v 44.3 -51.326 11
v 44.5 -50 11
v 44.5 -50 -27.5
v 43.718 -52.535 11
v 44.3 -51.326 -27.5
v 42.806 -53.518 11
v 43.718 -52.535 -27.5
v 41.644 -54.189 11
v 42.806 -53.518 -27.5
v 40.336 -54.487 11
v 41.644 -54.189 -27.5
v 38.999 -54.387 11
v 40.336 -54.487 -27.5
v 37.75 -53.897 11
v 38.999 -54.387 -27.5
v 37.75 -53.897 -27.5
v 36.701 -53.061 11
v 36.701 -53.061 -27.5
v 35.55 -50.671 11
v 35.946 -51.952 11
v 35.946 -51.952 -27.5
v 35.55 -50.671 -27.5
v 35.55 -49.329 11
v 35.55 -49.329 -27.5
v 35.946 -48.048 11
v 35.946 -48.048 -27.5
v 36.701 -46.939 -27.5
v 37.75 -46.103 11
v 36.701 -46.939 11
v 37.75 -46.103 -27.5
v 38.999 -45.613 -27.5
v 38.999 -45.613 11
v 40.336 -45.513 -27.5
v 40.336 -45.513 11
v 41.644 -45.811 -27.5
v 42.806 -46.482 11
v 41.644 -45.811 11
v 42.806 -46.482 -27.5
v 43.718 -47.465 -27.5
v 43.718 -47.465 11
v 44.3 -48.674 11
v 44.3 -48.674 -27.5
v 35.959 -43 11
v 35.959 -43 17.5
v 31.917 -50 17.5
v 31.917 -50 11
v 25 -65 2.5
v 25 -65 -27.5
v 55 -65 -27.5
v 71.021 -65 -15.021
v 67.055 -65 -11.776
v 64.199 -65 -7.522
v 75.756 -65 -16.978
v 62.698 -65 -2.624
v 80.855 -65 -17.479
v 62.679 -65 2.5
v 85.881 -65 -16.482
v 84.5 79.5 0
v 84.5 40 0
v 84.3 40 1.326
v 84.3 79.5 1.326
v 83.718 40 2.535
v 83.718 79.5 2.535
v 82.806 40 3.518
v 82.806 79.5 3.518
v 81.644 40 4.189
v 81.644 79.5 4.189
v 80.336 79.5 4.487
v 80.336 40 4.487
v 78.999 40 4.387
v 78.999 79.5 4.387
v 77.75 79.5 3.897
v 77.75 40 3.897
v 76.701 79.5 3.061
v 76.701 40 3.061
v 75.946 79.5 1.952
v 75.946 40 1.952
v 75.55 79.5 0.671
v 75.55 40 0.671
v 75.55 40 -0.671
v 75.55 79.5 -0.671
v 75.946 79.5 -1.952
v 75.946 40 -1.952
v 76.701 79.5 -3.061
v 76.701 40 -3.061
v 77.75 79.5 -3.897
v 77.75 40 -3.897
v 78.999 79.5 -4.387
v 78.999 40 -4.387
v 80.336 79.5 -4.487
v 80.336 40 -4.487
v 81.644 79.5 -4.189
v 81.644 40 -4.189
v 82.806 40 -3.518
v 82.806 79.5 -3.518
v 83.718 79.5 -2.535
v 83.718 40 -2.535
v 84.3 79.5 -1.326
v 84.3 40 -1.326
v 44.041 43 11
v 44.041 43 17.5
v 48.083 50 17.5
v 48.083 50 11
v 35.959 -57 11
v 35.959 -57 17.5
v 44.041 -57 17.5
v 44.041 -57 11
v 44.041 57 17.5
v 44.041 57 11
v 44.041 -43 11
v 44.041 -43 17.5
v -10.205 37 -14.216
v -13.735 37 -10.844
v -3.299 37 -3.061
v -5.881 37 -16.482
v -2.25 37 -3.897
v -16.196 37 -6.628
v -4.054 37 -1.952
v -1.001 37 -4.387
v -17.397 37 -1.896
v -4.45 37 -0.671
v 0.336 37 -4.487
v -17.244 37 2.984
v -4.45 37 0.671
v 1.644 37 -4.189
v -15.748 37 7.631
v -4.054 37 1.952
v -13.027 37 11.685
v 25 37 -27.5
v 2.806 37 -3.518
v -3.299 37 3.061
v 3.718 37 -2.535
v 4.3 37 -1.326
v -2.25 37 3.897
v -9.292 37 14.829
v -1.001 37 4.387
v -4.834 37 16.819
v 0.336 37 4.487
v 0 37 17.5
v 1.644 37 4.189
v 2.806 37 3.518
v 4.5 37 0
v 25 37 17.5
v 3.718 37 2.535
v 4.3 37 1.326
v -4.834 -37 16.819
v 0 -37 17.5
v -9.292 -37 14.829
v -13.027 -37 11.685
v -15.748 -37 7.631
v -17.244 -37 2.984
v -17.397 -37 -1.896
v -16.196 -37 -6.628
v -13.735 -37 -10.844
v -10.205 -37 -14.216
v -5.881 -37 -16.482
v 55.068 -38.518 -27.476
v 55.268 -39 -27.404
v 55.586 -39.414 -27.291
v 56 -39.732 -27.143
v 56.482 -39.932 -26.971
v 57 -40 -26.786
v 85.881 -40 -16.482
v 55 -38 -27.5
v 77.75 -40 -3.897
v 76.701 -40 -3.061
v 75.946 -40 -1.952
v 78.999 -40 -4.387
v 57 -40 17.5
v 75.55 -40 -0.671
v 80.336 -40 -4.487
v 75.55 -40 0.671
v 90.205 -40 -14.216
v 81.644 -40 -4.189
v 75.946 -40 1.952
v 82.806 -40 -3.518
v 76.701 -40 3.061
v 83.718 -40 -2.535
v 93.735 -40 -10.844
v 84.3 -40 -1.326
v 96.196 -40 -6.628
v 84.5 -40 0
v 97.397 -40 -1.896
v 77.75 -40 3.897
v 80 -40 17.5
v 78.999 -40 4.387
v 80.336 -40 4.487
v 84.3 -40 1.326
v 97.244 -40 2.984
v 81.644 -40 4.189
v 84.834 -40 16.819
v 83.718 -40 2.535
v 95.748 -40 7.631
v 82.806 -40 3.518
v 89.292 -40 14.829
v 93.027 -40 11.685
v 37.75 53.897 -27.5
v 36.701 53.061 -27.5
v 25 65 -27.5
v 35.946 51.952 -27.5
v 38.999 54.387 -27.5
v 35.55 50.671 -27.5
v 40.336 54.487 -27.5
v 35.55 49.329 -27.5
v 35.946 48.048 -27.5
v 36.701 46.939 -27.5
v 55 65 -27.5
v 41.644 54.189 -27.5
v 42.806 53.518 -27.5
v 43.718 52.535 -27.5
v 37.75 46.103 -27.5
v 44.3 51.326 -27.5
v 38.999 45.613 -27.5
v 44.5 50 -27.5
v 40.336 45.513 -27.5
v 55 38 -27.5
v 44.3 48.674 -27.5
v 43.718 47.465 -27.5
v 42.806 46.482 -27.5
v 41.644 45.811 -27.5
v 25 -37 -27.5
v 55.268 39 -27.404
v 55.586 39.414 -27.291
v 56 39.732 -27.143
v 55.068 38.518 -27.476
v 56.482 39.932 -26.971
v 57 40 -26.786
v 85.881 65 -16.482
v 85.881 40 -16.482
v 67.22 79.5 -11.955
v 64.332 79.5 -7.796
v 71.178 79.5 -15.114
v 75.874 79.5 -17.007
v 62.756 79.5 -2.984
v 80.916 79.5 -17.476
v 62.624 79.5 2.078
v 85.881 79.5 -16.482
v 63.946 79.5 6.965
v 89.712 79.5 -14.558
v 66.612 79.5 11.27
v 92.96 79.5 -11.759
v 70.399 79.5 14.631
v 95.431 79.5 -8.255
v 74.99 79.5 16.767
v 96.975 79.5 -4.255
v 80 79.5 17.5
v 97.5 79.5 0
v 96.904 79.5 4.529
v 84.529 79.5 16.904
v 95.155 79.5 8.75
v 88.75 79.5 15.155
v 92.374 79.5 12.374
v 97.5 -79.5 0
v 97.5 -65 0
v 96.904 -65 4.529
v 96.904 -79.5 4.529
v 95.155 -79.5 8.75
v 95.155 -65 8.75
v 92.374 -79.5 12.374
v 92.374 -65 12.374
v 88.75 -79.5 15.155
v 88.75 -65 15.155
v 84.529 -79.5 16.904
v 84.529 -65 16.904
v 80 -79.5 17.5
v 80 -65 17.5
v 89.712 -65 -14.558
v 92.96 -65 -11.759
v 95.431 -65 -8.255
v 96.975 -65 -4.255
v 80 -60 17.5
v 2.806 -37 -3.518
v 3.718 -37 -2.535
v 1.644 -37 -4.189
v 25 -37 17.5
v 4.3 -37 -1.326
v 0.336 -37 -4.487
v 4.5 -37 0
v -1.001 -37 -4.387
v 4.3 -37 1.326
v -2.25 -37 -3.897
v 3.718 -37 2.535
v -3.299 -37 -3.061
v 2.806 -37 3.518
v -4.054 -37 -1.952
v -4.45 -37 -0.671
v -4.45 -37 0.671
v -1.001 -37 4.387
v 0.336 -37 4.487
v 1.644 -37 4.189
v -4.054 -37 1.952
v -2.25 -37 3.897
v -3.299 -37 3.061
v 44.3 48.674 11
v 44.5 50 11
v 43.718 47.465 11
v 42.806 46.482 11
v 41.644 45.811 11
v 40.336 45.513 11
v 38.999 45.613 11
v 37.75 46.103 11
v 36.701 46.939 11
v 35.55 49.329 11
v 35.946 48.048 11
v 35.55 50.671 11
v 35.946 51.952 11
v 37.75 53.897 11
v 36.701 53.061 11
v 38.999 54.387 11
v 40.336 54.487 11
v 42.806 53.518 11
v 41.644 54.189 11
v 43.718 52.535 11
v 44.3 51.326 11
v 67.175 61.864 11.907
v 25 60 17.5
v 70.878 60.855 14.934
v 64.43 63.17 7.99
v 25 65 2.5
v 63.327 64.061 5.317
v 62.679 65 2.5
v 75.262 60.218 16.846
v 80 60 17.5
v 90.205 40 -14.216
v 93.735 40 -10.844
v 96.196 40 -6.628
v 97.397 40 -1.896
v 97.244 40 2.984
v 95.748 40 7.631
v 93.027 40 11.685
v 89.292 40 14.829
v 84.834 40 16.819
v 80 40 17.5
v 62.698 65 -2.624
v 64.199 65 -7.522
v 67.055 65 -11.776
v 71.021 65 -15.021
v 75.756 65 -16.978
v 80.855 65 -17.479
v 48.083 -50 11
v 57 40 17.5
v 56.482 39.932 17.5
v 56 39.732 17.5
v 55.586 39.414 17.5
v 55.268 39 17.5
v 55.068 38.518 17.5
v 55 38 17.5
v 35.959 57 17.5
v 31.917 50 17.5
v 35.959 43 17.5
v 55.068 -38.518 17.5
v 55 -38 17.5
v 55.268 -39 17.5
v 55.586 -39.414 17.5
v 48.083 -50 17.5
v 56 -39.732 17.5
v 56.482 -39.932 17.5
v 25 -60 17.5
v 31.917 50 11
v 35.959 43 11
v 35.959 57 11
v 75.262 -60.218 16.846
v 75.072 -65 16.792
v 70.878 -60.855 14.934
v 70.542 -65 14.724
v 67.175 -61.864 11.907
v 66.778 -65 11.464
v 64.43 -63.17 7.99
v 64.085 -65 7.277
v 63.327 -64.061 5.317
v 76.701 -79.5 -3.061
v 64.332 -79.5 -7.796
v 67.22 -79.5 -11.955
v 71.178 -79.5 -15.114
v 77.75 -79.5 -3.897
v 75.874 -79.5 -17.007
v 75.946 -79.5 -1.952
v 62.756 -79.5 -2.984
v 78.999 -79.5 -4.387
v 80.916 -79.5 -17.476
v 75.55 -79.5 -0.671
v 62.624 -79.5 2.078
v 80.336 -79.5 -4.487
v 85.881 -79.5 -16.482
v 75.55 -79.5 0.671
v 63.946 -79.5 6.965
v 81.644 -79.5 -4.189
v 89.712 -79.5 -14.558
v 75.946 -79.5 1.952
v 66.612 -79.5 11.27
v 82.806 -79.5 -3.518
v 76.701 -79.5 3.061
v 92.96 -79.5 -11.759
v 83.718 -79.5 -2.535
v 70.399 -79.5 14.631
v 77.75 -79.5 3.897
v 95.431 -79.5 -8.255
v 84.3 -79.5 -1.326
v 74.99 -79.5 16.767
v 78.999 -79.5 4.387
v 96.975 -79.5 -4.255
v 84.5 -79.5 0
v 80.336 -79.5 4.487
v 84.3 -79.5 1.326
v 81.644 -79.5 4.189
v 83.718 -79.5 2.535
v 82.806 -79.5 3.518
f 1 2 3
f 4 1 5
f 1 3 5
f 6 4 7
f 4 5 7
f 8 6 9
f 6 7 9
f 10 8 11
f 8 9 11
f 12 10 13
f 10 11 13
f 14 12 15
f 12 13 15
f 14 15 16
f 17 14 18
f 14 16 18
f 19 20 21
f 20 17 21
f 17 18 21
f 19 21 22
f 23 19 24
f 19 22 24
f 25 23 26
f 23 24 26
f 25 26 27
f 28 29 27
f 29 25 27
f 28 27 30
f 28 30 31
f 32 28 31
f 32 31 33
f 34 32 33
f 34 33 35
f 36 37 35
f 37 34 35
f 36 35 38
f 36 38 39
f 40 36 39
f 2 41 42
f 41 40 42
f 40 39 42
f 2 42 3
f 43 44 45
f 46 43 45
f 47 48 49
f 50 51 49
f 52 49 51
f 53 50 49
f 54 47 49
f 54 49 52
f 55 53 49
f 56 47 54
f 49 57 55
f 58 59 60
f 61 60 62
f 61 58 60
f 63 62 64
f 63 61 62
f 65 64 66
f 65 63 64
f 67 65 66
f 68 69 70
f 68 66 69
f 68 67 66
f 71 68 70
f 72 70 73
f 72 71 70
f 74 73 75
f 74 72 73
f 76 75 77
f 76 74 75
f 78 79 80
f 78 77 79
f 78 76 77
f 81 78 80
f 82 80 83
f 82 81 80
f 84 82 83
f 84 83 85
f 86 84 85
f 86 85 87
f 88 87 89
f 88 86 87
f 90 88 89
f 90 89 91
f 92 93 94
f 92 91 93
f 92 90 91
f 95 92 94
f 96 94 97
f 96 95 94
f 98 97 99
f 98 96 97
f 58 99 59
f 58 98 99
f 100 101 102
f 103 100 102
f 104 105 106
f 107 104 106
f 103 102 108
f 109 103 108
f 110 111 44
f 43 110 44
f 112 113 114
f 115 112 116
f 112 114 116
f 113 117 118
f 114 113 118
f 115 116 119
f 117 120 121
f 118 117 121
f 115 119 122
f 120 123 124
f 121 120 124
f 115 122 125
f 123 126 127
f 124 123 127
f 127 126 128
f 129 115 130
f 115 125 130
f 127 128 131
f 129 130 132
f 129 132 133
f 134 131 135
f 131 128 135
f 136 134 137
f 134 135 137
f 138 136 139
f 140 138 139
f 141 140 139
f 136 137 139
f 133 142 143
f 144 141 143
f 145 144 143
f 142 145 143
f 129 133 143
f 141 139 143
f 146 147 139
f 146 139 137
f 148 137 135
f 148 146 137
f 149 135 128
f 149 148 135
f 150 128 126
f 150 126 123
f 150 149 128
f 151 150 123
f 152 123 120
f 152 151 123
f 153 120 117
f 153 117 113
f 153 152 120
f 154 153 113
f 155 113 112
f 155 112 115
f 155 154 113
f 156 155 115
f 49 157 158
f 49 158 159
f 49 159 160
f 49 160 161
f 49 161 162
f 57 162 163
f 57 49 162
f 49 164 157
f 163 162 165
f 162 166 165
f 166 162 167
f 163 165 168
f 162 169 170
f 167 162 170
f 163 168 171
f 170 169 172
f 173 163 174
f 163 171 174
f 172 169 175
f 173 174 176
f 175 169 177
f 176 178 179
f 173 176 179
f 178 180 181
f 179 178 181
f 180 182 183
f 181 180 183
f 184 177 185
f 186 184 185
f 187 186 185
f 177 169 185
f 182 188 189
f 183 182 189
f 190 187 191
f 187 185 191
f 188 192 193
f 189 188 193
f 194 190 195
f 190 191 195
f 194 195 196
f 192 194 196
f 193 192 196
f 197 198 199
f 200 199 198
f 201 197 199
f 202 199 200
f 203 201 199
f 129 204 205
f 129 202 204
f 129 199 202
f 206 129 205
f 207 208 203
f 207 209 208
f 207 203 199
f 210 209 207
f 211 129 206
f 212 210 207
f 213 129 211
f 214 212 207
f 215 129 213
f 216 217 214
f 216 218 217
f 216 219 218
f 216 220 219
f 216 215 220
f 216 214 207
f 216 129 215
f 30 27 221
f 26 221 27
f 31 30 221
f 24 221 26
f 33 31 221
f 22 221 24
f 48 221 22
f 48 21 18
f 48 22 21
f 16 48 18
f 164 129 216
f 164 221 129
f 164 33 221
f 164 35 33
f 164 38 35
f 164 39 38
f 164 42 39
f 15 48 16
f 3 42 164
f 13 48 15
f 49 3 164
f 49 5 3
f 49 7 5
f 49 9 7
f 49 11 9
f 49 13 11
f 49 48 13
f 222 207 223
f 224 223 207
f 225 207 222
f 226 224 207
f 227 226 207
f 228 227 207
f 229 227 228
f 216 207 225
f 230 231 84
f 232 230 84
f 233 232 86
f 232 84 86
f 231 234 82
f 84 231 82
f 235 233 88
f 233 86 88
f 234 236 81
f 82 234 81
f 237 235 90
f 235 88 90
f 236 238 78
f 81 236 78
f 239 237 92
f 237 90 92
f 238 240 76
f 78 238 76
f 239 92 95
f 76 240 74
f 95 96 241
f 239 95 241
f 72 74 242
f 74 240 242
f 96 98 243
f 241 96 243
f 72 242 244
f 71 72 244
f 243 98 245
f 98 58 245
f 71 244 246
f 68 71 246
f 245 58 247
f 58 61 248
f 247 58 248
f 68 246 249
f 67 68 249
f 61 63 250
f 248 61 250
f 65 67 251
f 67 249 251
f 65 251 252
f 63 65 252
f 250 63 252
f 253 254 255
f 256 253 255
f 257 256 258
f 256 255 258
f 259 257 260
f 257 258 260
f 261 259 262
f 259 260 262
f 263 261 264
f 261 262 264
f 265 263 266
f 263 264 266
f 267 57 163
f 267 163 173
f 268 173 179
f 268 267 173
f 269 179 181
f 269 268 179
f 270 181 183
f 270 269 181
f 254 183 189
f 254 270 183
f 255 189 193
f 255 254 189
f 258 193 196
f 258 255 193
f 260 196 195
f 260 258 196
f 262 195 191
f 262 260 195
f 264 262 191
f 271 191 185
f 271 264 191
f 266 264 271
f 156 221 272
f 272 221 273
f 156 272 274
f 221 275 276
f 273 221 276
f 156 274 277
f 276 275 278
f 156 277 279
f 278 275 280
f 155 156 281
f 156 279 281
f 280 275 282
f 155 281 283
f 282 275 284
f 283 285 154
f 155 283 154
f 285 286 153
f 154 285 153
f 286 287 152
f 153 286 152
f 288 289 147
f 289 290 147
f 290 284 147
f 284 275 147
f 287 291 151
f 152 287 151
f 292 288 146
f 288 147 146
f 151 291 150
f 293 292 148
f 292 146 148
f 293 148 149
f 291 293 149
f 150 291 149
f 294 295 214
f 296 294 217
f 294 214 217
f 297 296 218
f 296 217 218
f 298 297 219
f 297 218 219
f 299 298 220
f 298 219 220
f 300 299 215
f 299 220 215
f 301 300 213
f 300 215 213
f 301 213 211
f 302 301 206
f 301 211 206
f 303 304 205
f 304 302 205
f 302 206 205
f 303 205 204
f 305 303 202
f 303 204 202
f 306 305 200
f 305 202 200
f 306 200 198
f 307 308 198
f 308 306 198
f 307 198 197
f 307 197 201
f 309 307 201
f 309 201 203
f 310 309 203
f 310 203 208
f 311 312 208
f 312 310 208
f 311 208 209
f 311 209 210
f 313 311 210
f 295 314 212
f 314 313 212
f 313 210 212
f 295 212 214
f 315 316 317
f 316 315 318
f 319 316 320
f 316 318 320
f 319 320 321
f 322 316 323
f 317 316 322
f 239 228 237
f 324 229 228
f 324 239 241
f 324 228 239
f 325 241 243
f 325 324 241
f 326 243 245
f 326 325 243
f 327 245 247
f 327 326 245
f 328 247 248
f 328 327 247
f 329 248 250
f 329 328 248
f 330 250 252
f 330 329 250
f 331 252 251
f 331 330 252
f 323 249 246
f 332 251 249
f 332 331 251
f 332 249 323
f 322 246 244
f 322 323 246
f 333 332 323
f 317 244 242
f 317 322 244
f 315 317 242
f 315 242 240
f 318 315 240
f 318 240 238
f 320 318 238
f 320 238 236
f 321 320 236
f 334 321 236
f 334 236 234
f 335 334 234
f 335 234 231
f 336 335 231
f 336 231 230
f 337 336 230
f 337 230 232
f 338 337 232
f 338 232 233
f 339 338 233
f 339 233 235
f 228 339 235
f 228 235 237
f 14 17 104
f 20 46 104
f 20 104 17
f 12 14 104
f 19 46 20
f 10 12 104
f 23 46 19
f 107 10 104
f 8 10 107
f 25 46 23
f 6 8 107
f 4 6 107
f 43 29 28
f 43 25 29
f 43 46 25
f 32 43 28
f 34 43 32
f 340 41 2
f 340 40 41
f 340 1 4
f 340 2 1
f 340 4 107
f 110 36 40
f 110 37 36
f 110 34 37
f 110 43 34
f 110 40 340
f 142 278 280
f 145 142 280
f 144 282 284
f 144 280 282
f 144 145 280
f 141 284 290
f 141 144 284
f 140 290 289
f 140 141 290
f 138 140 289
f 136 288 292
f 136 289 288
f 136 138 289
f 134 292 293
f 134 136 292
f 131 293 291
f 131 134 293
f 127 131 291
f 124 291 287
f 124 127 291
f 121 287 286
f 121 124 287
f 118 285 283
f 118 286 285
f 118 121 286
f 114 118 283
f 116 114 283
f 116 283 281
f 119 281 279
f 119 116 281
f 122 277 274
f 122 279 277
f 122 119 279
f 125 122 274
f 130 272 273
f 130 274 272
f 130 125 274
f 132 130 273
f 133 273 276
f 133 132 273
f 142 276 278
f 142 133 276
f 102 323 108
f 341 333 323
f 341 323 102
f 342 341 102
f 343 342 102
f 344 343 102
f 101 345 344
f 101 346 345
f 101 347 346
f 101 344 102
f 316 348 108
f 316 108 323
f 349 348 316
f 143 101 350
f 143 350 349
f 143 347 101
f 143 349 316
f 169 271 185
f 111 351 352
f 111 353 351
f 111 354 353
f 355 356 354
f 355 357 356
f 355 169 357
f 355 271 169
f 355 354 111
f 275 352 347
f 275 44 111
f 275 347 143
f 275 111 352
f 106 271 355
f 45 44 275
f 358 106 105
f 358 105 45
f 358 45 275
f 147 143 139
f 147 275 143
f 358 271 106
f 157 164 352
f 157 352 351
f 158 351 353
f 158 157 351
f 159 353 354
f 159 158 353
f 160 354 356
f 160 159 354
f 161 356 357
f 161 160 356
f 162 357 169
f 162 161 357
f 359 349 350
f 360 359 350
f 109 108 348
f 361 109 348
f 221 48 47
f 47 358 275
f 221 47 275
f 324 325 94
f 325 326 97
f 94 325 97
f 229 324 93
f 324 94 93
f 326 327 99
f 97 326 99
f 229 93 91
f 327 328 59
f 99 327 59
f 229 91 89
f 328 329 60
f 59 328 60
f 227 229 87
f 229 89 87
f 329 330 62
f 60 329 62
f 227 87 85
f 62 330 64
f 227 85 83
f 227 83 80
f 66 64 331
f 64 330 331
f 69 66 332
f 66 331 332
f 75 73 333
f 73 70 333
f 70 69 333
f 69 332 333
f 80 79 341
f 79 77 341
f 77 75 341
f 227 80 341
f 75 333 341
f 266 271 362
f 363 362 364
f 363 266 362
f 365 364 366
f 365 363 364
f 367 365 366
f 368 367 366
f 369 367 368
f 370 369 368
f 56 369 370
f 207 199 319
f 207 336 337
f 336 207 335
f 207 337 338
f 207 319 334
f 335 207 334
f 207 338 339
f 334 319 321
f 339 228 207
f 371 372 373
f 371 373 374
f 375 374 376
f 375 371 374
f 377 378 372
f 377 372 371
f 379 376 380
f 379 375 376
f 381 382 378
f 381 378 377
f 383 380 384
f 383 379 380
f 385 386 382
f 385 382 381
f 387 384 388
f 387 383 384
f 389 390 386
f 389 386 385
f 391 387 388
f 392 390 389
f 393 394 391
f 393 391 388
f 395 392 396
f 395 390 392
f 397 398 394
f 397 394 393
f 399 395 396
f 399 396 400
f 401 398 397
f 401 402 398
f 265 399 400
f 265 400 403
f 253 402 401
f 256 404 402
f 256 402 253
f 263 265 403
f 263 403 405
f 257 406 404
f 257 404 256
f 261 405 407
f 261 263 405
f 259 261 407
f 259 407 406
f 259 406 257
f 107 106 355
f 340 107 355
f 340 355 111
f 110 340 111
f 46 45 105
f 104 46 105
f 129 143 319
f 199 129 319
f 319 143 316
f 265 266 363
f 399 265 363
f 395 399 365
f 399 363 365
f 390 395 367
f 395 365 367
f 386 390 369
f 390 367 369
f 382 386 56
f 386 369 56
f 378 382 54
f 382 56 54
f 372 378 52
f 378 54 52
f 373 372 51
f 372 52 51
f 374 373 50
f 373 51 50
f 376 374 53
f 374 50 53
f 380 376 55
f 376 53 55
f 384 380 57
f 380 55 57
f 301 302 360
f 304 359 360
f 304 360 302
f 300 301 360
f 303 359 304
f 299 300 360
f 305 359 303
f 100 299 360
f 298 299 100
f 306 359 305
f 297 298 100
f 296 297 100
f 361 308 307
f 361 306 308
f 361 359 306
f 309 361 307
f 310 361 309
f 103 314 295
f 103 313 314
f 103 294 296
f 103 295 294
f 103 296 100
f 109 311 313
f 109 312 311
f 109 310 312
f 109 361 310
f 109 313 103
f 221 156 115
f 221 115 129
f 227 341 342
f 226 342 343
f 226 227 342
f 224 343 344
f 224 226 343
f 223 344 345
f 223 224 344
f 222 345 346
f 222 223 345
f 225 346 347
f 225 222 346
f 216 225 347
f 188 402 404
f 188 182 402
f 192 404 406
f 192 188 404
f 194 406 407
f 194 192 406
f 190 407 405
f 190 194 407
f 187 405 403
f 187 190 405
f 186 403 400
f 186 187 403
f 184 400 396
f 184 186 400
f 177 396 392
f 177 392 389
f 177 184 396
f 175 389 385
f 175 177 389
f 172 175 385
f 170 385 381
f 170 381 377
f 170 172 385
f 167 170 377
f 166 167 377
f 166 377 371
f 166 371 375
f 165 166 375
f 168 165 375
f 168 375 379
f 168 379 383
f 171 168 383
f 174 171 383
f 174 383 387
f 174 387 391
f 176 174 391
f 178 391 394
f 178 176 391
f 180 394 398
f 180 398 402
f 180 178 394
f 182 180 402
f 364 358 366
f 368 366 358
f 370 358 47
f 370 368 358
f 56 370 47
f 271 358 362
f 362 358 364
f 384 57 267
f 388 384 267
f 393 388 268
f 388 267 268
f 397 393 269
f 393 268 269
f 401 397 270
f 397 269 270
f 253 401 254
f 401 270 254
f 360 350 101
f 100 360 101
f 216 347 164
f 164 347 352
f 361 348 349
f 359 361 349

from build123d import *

# Parameters (mm, degrees)
F0_R          = 4.5
F1_DEPTH      = 65
F2_W          = 24.1539999843
F2_H          = 28
F2_W_2        = 25
F2_W_3        = 30
F2_H_2        = 80
F3_DEPTH      = 45.001
F4_R          = 4.5
F5_DEPTH      = 45.001
F6_R          = 4.5
F7_DEPTH      = 6.5
F8_R          = 4.5
F9_DEPTH      = 14.5
F10_T4_DEPTH  = 132.8518303197
F10_S5_R      = 17.5
F10_T6_DEPTH  = 68
F10_T10_DEPTH = 132.8518303197
F10_S11_R     = 17.5
F10_T12_DEPTH = 68
F11_R         = 2


# Not quite as in the source:
# - a fillet or chamfer that OpenCascade refuses, or shapes differently, is made with other operations: its cross-section is extruded or revolved along the edge and cut away or added
# - a pattern or mirror of a feature is missing from the dataset's text; its kind, count and spacing are read off the source's solid


with BuildPart() as f1:
    # F0 (on Front) → F1 (new body, symmetric)
    with BuildSketch(Plane.XZ):
        with BuildLine():
            Line((80, 17.5), (0, 17.5))
            ThreePointArc((0, 17.5), (-17.2437155554, 2.9840029898), (-5.880605574, -16.4823687036))
            Line((-5.880605574, -16.4823687036), (25, -27.5))
            Line((25, -27.5), (55, -27.5))
            Line((55, -27.5), (85.880605574, -16.4823687036))
            ThreePointArc((85.880605574, -16.4823687036), (97.2437155554, 2.9840029898), (80, 17.5))
        make_face()
        Circle(F0_R, mode=Mode.SUBTRACT)
        with Locations((80, 0)):
            Circle(F0_R, mode=Mode.SUBTRACT)
    extrude(amount=F1_DEPTH, both=True)

    # F2 (on face) → F3 (cut, through all)
    with BuildSketch(Plane.XY.offset(17.5)):
        with Locations((-12.0769999921, 51)):
            Rectangle(F2_W, F2_H)
        with Locations((12.5, 51)):
            Rectangle(F2_W_2, F2_H)
        with Locations((-12.0769999921, -51)):
            Rectangle(F2_W, F2_H)
        with Locations((12.5, -51)):
            Rectangle(F2_W_2, F2_H)
        Polygon((55, 40), (55, 0), (55, -40), (80, -40), (80, 40), align=None)
        with Locations((95, 0)):
            Rectangle(F2_W_3, F2_H_2)
    extrude(amount=-F3_DEPTH, mode=Mode.SUBTRACT)

    # F4 (on face) → F5 (cut, through all)
    with BuildSketch(Plane(origin=(0, 0, -27.5), x_dir=(1, 0, 0), z_dir=(0, 0, -1))):
        with Locations((40, 50)):
            Circle(F4_R)
        with Locations((40, -50)):
            Circle(F4_R)
    extrude(amount=-F5_DEPTH, mode=Mode.SUBTRACT)

    # F6 (on face) → F7 (cut)
    with BuildSketch(Plane.XY.offset(17.5)):
        Polygon((35.9585481157, 43), (44.0414518843, 43), (48.0829037687, 50), (44.0414518843, 57), (35.9585481157, 57), (31.9170962313, 50), align=None)
        with Locations((40, 50)):
            Circle(F6_R, mode=Mode.SUBTRACT)
        Polygon((44.0414518843, -57), (48.0829037687, -50), (44.0414518843, -43), (35.9585481157, -43), (31.9170962313, -50), (35.9585481157, -57), align=None)
        with Locations((40, -50)):
            Circle(F6_R, mode=Mode.SUBTRACT)
    extrude(amount=-F7_DEPTH, mode=Mode.SUBTRACT)

    # F8 (on face) → F9 (join)
    with BuildSketch(Plane.XZ.offset(65)):
        with BuildLine():
            ThreePointArc((85.880605574, -16.4823687036), (94.3031569513, -10.0831394529), (97.5, 0))
            ThreePointArc((97.5, 0), (92.3743686708, 12.3743686708), (80, 17.5))
            ThreePointArc((80, 17.5), (62.7562844446, -2.9840029898), (85.880605574, -16.4823687036))
        make_face()
        with Locations((80, 0)):
            Circle(F8_R, mode=Mode.SUBTRACT)
    f9 = extrude(amount=F9_DEPTH)

    # F9_copies: F9 across plane
    add(f9.mirror(Plane.ZX))

    # F10: chamfer of 5 x 15 on 2 edges, made by hand


with BuildPart() as f10_tool2:
    # F10_s3 → F10_t4 (new body)
    with BuildSketch(Plane.YZ.offset(118.9259151598)):
        Polygon((-60, 17.5), (-65, 2.5), (-65, 17.5), align=None)
    extrude(amount=-F10_T4_DEPTH)

    # F10_s5 → F10_t6 (cut, symmetric)
    with BuildSketch(Plane.XZ.offset(62.5)):
        with Locations((80, 0)):
            Circle(F10_S5_R)
    extrude(amount=F10_T6_DEPTH, both=True, mode=Mode.SUBTRACT)


with BuildPart() as f1_1:
    add(f1.part)

    # F10_t1: cut F10_tool2
    add(f10_tool2.part, mode=Mode.SUBTRACT)


with BuildPart() as f10_tool8:
    # F10_s9 → F10_t10 (new body)
    with BuildSketch(Plane.YZ.offset(118.9259151598)):
        Polygon((60, 17.5), (65, 2.5), (65, 17.5), align=None)
    extrude(amount=-F10_T10_DEPTH)

    # F10_s11 → F10_t12 (cut, symmetric)
    with BuildSketch(Plane.XZ.offset(-62.5)):
        with Locations((80, 0)):
            Circle(F10_S11_R)
    extrude(amount=F10_T12_DEPTH, both=True, mode=Mode.SUBTRACT)


with BuildPart() as f1_2:
    add(f1_1.part)

    # F10_t7: cut F10_tool8
    add(f10_tool8.part, mode=Mode.SUBTRACT)

    # F11
    f11_edges = [f1_2.edges().sort_by_distance(p)[0] for p in [
        (55, -40, -5),
        (55, 40, -5),
    ]]
    fillet(f11_edges, radius=F11_R)


solid = f1_2.part
